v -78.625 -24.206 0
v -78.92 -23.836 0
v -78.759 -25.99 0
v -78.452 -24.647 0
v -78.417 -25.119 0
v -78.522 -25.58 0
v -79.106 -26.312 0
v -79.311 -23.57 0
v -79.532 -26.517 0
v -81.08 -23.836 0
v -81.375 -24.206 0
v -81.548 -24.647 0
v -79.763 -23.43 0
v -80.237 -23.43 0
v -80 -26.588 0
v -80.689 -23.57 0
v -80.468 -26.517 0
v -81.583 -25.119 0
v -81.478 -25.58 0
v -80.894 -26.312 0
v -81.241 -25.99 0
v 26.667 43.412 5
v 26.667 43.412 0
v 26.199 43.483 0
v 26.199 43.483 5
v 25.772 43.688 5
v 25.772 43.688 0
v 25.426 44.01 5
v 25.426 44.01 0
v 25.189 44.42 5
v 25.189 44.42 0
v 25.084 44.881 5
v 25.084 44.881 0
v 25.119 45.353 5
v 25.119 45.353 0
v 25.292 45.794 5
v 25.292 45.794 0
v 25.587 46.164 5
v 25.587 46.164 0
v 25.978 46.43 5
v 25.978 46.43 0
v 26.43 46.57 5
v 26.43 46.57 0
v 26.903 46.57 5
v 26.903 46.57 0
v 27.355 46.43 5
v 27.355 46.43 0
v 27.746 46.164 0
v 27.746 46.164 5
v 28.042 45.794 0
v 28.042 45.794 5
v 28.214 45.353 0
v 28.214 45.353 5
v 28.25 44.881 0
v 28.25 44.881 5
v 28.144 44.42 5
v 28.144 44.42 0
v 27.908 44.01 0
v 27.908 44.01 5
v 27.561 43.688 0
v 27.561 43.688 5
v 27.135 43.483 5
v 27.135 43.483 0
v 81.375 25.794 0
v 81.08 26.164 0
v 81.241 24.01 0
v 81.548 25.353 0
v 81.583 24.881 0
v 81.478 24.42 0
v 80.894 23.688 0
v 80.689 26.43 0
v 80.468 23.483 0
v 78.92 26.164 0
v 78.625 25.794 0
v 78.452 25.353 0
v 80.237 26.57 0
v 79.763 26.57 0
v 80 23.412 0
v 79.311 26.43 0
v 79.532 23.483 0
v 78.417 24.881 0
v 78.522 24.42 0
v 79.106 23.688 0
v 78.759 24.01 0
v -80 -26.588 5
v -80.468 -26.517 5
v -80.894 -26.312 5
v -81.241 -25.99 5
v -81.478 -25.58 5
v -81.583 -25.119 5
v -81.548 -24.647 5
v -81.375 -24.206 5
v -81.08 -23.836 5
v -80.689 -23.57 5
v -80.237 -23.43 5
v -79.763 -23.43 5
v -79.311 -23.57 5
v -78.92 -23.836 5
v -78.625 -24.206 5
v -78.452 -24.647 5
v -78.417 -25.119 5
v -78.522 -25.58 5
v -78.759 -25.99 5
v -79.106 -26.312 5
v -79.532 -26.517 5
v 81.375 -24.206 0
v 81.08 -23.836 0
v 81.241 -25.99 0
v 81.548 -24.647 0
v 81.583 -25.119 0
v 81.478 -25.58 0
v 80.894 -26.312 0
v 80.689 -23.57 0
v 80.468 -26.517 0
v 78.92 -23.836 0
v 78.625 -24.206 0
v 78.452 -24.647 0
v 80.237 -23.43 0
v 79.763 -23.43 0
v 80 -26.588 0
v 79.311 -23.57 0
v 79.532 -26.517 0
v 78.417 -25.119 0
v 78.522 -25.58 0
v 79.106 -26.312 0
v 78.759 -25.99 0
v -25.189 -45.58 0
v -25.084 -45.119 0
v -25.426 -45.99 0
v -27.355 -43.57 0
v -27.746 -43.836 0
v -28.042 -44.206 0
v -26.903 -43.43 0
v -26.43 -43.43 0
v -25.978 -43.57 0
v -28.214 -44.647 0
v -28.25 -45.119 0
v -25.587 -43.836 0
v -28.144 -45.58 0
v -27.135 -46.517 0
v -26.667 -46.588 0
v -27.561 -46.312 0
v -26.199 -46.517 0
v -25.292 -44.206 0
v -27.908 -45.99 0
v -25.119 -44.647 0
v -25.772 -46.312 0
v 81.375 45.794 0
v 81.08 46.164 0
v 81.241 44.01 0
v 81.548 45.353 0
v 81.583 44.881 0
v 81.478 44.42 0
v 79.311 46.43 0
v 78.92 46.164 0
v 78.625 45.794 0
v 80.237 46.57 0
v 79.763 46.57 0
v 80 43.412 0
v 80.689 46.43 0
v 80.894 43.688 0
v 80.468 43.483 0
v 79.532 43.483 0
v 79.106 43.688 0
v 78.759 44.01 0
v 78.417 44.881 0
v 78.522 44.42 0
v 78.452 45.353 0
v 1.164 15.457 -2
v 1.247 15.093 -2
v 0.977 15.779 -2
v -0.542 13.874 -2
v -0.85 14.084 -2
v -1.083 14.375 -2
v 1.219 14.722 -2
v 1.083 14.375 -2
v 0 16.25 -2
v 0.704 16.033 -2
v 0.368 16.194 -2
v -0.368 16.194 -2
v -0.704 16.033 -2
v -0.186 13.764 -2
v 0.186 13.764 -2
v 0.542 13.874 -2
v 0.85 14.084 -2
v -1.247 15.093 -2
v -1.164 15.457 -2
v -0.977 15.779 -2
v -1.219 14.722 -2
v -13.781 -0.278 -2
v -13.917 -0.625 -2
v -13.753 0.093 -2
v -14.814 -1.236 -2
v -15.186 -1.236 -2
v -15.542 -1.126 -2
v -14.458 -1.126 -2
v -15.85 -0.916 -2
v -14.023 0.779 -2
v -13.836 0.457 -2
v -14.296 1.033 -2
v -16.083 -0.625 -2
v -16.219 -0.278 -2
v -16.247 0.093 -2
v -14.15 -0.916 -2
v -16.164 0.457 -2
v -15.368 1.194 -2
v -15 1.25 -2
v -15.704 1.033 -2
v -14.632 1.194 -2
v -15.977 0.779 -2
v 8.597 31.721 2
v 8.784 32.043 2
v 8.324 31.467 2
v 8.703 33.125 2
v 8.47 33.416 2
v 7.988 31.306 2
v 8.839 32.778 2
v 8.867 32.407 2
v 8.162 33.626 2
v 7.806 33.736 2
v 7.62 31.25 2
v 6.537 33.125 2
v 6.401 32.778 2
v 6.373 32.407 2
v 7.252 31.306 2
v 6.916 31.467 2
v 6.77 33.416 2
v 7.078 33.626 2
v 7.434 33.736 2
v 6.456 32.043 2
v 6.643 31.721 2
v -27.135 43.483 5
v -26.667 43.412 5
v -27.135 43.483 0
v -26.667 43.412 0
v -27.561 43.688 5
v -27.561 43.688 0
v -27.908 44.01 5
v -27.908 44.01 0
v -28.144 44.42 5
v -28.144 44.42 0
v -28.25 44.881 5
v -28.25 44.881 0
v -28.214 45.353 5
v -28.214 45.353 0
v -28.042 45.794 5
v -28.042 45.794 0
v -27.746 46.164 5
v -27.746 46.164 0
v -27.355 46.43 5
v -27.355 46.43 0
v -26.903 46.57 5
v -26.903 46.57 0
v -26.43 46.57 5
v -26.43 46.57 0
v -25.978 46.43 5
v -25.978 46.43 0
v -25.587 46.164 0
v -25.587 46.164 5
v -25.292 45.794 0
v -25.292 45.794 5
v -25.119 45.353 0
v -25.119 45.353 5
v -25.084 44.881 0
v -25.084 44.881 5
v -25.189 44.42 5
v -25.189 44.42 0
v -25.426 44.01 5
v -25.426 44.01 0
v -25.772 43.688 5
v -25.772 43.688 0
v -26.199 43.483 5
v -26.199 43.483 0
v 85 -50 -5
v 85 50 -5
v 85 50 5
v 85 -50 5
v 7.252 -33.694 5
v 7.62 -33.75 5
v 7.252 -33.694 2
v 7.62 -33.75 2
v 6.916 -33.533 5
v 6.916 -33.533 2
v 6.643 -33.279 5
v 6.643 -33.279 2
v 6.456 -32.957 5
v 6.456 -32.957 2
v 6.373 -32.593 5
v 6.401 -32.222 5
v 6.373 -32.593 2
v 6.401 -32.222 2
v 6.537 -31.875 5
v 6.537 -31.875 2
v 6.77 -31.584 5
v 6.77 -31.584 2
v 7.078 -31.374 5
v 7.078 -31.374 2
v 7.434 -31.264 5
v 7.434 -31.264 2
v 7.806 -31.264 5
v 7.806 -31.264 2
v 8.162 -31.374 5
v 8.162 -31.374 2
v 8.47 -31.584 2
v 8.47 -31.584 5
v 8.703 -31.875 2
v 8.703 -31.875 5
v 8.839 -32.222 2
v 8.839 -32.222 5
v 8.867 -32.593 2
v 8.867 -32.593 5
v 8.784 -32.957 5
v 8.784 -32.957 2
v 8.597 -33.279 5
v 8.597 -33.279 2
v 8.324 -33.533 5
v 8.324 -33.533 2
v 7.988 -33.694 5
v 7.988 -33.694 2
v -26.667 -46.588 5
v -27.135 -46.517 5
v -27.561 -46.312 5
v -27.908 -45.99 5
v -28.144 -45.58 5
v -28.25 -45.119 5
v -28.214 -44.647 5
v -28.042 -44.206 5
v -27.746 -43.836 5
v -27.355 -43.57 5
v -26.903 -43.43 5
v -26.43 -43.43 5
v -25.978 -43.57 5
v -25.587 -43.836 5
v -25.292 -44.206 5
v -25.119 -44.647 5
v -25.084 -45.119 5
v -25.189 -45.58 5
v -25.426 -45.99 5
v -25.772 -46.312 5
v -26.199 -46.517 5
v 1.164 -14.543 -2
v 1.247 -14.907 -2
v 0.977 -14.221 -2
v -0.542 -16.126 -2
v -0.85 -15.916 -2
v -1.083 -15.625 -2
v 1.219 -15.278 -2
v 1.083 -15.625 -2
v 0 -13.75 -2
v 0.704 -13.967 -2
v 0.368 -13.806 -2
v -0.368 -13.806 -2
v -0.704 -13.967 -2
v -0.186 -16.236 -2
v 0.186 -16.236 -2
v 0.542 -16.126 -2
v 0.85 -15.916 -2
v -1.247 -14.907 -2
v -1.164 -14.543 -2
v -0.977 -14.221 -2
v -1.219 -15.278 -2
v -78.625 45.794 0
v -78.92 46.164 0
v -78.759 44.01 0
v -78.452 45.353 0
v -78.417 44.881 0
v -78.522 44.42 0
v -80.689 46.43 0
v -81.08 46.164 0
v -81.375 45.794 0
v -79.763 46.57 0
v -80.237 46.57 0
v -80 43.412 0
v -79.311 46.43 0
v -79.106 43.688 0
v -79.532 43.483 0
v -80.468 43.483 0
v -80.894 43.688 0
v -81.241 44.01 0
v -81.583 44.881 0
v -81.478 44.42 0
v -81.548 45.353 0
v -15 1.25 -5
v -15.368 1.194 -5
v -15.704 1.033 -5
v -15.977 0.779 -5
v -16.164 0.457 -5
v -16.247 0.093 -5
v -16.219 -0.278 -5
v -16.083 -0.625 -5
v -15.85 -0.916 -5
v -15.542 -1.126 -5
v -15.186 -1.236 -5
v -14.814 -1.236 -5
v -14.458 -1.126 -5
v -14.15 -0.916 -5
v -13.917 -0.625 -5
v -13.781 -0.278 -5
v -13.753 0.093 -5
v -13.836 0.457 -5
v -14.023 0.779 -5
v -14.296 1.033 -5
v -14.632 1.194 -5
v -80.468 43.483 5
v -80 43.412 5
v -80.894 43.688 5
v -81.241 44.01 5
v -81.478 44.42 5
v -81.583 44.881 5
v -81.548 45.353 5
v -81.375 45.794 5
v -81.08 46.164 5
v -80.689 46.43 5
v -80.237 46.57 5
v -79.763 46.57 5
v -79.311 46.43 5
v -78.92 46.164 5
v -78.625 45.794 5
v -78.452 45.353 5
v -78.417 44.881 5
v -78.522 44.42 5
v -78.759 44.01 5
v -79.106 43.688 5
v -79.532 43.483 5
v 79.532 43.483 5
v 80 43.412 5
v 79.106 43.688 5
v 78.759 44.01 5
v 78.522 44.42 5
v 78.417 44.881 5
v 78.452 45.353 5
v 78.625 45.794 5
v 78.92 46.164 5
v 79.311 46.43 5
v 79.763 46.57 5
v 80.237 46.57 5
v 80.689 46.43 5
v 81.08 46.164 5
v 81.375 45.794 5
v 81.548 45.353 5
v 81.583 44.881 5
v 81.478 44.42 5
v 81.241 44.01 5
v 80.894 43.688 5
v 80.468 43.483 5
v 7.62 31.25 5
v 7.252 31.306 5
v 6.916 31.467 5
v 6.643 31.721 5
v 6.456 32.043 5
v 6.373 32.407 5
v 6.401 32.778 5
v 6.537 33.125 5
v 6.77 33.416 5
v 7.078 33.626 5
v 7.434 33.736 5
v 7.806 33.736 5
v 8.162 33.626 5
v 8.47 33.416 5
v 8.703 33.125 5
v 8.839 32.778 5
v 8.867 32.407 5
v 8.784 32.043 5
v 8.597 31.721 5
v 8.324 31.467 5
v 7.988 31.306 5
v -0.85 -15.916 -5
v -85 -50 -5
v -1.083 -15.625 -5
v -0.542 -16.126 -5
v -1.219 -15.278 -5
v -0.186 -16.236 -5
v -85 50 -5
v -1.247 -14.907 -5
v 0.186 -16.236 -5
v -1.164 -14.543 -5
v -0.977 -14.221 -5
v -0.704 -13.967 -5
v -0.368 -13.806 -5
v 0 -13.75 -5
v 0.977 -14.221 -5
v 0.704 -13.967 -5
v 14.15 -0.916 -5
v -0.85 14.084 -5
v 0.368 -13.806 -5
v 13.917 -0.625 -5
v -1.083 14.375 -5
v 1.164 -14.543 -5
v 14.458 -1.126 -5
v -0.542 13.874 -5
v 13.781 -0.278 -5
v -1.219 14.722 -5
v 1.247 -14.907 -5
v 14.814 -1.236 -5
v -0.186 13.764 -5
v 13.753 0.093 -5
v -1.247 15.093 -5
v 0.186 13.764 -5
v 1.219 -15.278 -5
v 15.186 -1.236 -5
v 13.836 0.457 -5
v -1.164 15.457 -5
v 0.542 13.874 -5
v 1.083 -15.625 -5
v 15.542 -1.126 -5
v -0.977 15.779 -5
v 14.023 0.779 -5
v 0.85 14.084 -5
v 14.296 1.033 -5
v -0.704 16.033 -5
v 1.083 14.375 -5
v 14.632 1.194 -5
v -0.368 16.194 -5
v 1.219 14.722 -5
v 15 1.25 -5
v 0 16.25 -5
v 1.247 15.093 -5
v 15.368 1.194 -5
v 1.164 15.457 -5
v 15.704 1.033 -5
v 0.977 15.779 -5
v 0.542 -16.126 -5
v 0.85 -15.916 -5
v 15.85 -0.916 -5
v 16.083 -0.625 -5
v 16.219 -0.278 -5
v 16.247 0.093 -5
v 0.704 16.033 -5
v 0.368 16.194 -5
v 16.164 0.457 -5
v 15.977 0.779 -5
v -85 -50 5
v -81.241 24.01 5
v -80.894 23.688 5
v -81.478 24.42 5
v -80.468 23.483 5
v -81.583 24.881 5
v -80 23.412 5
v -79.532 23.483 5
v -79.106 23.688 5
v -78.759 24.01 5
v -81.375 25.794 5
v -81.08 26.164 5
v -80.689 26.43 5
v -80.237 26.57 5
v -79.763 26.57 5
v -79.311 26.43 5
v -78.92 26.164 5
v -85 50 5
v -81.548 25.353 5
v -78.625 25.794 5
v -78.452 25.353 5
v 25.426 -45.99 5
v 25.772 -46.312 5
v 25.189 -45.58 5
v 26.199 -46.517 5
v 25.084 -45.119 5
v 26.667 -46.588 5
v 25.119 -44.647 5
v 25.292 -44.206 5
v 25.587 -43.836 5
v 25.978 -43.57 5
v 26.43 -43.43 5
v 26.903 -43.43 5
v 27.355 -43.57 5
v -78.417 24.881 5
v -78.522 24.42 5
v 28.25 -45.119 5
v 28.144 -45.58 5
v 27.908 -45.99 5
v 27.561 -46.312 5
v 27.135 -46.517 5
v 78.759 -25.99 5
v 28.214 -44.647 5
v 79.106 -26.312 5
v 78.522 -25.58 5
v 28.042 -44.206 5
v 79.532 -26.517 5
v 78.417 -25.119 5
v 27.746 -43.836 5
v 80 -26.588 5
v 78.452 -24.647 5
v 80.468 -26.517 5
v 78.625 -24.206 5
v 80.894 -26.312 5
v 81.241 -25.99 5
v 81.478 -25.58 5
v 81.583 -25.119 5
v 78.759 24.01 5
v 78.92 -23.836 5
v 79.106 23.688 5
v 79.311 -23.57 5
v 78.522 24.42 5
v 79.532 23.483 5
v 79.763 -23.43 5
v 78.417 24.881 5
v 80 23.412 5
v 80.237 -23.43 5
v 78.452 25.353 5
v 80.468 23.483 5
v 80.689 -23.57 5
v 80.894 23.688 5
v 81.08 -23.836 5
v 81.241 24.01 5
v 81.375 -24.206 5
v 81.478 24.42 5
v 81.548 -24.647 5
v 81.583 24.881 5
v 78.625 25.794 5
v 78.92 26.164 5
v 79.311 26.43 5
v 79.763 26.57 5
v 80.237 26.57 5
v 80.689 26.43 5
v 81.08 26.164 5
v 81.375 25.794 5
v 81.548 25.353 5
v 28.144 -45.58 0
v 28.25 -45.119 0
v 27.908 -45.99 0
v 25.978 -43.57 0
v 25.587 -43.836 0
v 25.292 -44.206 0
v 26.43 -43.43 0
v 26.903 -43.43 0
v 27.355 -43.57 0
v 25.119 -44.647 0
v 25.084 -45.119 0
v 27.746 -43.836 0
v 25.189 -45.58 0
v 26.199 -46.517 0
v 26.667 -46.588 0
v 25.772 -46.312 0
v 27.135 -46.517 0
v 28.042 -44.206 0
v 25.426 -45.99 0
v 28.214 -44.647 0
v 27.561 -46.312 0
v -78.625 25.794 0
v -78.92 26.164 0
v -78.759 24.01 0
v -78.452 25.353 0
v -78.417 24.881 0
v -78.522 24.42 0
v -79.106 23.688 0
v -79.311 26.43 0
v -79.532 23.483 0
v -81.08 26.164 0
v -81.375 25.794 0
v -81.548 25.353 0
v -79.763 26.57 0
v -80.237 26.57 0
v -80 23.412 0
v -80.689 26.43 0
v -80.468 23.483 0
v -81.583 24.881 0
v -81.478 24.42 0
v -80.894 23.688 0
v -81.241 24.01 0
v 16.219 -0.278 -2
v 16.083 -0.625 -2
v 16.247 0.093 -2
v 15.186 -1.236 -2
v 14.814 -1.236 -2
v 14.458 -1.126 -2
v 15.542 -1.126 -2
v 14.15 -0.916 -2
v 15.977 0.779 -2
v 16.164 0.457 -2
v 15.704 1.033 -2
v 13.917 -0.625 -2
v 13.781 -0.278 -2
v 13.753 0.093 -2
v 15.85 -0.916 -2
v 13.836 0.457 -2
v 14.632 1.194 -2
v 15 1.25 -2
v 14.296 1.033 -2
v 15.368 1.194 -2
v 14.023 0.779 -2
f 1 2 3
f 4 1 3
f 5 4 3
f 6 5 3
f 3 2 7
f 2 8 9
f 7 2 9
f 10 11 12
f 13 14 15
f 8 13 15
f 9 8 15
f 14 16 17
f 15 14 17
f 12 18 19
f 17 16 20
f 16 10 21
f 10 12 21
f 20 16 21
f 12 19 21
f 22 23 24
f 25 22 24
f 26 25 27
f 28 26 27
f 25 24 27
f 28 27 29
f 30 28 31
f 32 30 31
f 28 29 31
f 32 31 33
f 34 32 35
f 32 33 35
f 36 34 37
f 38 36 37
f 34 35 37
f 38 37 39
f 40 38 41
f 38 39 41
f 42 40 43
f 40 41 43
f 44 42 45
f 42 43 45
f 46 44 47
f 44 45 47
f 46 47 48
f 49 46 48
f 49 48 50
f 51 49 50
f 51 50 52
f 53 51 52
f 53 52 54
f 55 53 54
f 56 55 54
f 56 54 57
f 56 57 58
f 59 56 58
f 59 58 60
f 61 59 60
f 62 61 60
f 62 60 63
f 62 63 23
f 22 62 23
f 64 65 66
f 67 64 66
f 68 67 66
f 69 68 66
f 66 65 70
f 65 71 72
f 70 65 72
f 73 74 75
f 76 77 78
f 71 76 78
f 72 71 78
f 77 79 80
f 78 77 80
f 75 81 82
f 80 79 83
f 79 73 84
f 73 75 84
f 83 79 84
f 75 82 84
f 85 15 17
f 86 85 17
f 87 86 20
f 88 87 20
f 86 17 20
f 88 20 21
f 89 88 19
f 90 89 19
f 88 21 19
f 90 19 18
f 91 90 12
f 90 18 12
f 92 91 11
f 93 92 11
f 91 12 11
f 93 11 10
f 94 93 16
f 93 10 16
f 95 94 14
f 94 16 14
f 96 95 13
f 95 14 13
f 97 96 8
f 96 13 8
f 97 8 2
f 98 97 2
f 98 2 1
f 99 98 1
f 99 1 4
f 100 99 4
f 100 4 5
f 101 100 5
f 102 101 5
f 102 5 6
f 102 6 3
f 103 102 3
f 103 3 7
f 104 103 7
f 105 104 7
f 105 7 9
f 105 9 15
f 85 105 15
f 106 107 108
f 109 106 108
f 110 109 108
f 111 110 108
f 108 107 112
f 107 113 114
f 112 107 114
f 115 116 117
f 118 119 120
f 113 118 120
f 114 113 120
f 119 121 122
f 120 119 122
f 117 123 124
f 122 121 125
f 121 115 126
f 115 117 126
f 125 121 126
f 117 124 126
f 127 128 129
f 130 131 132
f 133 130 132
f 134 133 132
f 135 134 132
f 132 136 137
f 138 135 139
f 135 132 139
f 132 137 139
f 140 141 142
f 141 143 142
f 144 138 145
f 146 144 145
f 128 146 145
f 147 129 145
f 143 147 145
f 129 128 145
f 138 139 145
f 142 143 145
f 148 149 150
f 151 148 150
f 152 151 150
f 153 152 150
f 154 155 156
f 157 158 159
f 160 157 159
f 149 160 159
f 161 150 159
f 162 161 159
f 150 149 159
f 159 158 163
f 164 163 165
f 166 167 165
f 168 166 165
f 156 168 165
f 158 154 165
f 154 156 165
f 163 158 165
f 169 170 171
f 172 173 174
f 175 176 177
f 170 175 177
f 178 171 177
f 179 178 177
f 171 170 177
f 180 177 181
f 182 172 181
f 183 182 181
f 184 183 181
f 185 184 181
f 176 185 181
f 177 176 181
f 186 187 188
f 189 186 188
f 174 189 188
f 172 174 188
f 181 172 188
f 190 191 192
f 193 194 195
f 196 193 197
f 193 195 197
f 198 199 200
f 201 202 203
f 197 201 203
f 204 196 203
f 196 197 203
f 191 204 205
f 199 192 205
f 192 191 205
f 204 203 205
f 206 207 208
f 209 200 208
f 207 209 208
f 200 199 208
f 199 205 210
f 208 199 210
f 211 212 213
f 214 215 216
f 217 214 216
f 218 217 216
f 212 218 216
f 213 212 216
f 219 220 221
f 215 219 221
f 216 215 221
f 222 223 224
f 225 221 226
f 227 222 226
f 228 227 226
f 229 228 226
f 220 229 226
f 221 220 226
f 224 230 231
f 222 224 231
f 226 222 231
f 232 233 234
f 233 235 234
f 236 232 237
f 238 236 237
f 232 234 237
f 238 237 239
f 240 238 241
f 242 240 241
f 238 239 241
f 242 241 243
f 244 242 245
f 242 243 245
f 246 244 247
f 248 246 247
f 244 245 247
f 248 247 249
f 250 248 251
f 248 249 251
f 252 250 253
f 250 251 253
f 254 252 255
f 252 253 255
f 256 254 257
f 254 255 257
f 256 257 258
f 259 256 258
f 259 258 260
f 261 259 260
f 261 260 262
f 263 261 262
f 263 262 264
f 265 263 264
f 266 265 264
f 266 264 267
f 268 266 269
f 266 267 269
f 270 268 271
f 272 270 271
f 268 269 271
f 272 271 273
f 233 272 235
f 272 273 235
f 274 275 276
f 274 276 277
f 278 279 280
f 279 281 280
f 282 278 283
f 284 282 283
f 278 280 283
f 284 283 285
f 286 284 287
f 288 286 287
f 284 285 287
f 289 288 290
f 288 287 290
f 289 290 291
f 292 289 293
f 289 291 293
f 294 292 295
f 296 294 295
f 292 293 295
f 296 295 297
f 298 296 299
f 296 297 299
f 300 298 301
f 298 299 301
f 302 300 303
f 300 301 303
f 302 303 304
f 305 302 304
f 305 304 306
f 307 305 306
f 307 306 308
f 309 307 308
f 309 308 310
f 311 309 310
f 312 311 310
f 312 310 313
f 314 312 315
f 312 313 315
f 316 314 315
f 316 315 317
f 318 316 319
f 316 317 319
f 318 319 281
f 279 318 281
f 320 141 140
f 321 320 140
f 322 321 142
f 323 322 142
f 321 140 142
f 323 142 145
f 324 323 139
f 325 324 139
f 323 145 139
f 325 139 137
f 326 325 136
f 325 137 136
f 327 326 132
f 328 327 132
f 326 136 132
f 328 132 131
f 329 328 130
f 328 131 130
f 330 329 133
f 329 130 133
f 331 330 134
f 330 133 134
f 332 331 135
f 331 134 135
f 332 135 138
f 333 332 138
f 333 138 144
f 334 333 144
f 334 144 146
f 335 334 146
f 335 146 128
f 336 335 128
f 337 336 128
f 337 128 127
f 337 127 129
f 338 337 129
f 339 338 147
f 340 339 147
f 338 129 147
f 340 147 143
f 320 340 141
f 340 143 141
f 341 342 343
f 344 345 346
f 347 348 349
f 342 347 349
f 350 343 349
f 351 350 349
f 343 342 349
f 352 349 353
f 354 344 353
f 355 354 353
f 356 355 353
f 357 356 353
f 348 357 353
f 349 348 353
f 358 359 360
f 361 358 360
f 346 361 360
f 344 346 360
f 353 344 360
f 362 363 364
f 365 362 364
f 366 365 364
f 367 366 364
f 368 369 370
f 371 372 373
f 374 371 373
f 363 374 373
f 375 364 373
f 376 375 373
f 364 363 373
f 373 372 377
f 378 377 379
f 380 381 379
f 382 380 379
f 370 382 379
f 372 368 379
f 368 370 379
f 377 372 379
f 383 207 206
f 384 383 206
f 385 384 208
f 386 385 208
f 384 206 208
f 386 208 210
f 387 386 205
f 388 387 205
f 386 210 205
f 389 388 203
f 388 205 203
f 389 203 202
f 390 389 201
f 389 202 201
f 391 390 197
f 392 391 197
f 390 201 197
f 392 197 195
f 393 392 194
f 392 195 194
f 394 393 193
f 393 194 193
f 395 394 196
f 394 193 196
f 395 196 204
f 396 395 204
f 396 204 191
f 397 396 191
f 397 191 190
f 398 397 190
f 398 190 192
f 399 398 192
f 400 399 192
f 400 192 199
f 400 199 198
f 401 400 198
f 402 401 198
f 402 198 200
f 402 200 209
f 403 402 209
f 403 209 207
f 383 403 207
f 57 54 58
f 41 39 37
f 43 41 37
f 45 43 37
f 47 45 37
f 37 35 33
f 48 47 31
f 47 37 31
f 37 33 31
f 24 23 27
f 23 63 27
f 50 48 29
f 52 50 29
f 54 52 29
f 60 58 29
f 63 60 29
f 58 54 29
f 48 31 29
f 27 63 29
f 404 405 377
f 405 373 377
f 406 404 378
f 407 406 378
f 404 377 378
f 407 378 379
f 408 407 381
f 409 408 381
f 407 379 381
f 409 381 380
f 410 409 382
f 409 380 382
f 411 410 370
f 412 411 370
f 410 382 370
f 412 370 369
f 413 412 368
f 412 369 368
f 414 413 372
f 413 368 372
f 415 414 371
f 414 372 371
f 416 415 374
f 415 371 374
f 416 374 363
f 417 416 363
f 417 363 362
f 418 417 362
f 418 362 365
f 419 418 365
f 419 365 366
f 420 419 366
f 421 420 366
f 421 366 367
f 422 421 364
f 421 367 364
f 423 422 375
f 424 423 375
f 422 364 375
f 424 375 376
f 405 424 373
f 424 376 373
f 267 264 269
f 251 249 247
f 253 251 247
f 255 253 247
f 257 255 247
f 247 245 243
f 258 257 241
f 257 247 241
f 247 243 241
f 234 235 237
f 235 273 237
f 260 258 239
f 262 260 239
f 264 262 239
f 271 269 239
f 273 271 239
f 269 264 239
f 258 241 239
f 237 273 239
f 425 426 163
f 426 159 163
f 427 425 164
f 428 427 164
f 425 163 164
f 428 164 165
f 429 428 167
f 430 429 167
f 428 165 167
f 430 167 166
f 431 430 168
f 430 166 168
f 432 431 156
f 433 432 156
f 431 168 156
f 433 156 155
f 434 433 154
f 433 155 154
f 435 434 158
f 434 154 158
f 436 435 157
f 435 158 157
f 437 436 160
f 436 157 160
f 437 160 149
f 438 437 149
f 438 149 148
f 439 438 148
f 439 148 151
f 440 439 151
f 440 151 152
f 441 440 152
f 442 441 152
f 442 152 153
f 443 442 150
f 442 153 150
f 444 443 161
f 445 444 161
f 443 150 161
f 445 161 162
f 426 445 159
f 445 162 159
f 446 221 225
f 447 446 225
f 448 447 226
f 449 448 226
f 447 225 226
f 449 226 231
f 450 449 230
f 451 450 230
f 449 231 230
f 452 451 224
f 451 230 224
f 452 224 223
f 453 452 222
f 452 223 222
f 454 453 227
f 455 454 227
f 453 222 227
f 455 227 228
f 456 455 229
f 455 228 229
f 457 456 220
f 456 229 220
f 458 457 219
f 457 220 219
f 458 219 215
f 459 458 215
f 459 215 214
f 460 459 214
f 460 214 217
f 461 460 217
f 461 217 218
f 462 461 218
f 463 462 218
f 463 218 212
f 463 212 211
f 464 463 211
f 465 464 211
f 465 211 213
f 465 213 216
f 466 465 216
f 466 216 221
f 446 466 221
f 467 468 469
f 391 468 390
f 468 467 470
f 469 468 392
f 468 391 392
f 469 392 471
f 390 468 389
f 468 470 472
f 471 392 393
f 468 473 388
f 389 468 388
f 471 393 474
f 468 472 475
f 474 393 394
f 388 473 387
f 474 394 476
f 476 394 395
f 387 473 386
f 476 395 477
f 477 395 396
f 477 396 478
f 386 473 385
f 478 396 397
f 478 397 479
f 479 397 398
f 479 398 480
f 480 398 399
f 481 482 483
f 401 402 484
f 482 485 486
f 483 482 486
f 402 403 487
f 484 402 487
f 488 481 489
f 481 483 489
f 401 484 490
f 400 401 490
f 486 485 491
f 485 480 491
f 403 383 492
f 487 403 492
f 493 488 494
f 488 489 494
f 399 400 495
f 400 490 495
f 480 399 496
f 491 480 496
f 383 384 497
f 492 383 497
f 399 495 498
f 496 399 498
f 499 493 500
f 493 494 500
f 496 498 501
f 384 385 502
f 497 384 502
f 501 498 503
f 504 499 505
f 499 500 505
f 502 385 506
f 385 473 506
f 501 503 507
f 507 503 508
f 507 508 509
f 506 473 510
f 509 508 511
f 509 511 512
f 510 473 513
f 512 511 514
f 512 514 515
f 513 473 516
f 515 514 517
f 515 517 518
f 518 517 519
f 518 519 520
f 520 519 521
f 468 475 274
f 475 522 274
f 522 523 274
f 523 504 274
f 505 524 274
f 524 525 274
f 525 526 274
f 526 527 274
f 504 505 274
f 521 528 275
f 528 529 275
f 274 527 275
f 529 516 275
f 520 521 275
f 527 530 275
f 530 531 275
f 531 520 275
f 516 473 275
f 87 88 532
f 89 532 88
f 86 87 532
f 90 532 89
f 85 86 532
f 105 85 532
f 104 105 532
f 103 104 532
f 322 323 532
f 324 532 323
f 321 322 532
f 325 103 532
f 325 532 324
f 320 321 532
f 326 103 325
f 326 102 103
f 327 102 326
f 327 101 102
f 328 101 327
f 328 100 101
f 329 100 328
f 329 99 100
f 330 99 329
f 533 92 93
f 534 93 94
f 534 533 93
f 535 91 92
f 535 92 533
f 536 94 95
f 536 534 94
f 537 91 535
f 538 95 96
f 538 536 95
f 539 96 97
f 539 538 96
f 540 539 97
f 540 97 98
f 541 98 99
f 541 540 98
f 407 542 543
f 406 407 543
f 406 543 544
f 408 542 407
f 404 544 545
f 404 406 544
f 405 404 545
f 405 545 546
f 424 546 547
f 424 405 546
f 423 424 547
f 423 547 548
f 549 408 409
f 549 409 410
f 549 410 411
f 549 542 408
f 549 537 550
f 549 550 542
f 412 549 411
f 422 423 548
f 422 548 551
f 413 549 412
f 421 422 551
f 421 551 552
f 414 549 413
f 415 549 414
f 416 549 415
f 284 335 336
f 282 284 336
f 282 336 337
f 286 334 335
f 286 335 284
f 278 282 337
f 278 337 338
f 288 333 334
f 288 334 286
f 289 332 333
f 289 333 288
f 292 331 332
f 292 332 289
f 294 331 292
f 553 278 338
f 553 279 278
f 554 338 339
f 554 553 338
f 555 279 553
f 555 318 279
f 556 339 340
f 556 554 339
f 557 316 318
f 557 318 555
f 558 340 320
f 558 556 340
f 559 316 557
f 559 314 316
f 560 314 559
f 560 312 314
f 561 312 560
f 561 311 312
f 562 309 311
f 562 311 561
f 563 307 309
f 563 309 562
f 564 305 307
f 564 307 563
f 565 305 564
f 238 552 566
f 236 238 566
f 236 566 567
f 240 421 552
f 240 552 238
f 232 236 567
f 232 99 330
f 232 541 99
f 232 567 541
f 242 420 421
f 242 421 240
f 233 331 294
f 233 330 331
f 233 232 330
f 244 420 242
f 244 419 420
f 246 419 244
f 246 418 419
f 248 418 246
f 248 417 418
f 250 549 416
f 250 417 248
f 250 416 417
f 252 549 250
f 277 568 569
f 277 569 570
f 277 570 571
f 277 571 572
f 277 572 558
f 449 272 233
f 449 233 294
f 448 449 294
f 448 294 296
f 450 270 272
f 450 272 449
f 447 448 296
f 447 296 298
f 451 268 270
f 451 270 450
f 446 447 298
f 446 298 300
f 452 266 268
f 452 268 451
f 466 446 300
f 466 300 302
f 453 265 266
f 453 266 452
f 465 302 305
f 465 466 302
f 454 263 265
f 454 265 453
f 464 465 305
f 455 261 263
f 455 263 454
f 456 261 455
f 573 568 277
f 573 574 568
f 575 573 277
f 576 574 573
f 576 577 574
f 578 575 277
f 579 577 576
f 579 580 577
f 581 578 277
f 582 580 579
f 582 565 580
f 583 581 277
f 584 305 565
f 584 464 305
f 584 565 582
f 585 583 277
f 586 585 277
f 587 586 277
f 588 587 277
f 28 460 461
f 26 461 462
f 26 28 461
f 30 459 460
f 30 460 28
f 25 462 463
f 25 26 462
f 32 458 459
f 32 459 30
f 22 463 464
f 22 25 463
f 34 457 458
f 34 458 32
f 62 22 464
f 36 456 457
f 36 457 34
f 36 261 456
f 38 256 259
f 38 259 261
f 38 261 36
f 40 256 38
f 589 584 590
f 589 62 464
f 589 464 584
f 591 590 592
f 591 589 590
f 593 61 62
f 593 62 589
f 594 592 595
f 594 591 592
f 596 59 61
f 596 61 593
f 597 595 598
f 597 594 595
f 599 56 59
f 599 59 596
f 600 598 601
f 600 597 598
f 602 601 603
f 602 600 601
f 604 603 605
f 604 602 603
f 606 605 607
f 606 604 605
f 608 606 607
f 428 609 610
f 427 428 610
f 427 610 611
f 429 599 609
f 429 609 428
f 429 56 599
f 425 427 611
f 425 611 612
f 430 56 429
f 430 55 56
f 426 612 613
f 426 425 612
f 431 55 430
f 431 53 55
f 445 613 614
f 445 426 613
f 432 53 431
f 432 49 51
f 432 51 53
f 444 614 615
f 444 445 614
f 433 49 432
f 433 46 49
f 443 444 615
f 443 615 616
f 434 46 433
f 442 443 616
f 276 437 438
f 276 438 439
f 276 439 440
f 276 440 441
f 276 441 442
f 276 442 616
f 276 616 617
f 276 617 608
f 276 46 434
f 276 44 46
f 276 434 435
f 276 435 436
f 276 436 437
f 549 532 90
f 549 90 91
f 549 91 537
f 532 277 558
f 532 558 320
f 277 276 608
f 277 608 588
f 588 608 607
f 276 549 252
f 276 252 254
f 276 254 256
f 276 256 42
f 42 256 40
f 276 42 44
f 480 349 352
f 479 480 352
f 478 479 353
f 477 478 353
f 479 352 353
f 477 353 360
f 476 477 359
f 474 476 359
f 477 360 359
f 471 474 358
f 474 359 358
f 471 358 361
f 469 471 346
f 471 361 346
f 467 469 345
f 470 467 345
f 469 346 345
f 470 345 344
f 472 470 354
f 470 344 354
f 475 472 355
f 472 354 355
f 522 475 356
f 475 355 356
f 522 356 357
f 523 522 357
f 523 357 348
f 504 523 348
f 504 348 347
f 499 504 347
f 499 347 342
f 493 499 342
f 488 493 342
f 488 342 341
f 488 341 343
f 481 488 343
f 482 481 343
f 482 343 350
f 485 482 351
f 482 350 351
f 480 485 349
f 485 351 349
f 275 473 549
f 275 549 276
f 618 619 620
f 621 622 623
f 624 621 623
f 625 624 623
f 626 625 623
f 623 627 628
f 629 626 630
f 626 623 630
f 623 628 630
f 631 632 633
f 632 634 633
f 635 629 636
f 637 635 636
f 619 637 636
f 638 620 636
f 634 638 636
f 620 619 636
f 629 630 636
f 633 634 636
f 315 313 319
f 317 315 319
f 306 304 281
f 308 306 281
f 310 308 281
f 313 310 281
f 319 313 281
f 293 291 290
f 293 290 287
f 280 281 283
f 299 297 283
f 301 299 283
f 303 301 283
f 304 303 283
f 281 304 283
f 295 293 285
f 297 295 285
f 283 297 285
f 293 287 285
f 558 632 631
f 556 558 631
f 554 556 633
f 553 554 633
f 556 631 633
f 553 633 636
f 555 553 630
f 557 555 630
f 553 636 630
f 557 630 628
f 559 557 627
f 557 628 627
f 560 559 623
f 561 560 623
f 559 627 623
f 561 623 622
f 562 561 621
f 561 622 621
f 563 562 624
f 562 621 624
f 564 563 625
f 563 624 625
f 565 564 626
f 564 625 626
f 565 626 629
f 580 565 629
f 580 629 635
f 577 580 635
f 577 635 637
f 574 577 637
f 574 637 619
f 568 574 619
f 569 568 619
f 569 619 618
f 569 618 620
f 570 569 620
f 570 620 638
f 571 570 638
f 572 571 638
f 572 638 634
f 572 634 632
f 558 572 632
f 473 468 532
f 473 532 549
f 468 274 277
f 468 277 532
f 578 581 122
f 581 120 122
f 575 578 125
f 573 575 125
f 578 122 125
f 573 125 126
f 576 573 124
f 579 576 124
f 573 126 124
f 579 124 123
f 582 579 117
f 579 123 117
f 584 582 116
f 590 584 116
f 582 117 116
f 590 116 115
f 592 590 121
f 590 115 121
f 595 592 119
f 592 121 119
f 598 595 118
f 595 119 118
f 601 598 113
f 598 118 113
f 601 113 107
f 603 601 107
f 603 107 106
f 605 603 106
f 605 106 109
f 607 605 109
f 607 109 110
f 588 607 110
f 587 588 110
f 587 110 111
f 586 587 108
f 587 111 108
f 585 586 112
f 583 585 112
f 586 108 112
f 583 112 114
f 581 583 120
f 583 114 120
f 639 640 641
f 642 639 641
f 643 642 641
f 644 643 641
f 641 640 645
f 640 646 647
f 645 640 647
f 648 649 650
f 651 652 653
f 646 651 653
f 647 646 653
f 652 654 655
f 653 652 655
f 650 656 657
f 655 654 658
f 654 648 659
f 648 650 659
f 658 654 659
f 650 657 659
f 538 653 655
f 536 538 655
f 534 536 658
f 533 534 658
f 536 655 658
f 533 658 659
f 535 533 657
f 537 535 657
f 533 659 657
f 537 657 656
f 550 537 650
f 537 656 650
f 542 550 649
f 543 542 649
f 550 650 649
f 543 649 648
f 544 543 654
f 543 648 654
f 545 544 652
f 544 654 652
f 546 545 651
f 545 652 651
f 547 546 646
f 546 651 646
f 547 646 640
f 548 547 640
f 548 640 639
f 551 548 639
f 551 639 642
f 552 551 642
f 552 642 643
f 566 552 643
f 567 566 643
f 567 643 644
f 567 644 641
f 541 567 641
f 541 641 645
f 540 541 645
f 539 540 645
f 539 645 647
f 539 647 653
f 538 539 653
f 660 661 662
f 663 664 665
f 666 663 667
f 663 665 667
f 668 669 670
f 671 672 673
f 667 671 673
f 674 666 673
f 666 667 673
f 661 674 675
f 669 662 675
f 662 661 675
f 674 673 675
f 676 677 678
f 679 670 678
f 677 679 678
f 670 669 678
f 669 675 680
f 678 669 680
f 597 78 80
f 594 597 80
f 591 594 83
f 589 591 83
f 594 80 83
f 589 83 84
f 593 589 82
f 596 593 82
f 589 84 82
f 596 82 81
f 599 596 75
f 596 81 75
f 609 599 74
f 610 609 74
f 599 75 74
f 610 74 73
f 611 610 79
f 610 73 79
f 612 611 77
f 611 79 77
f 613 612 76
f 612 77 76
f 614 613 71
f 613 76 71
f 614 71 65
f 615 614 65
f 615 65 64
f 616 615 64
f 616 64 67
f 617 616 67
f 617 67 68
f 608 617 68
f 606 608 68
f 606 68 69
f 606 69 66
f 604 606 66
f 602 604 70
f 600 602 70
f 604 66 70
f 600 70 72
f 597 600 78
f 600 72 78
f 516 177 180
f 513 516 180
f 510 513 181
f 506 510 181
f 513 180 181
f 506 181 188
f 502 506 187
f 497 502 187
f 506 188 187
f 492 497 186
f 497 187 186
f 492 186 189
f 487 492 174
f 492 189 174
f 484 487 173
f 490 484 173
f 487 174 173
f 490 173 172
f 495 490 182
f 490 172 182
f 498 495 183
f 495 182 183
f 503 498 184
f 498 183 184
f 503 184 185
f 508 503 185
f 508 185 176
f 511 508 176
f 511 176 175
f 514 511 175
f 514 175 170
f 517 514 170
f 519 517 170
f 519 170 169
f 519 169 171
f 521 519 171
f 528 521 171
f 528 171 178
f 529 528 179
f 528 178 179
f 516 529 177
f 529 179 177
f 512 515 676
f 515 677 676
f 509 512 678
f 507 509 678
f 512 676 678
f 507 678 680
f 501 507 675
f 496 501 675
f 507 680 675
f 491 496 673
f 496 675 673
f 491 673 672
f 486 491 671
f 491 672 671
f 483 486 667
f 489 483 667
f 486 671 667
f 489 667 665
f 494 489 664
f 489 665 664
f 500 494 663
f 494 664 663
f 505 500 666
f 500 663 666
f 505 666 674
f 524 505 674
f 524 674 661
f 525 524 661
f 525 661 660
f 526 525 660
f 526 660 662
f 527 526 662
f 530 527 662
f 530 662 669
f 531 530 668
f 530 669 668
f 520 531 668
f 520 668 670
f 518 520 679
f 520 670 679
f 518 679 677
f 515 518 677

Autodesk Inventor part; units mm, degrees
ref_plane "YZ Plane" through (0, 0, 0) normal (1, 0, 0) x (0, 1, 0)
ref_plane "XZ Plane" through (0, 0, 0) normal (0, 1, 0) x (-1, 0, 0)
ref_plane "XY Plane" through (0, 0, 0) normal (0, 0, 1) x (1, 0, 0)
sketch "Sketch1" plane through (0, 0, 0) normal (0, 0, 1) x (1, 0, 0)
  line L0 (-85, 50) -> (85, 50)
  line L1 (85, 50) -> (85, -50)
  line L2 (85, -50) -> (-85, -50)
  line L3 (-85, -50) -> (-85, 50)
  line L4 (-85, 50) -> (85, -50) construction
  line L5 (85, 50) -> (-85, -50) construction
  point P0 (0, 0)
  dimension "d0" = 170
  dimension "d1" = 100
extrude "Extrusion1" add sketch "Sketch1" along normal mid plane 10
sketch "Sketch2" plane through (0, 0, 5) normal (0, 0, 1) x (1, 0, 0)
  line L0 (-85, 50) -> (-85, -50) projected
  line L1 (-85, -50) -> (85, -50) projected
  line L2 (85, -50) -> (85, 50) projected
  line L3 (85, 50) -> (-85, 50) projected
  line L4 (-85, 50) -> (-85, -50) projected
  point P0 (0, 0)
  point P1 (80, 45)
  point P2 (26.6667, 45)
  point P3 (-80, 45)
  point P4 (80, 25)
  point P5 (80, -25)
  point P6 (-80, 25)
  point P7 (-80, -25)
  point P8 (-26.6667, 45)
  point P9 (26.6667, -45)
  point P10 (-26.6667, -45)
  dimension "d17" = 53.3333
  dimension "d53" = 50
  dimension "d61" = 160
  dimension "d68" = 160
  dimension "d73" = 5
  dimension "d74" = 5
  dimension "d75" = 5
  dimension "d77" = 5
  dimension "d112" = 53.3333
  dimension "d115" = 90
  dimension "d118" = 25
hole "Hole1" at (-80, 45, 5) at (26.6667, 45, 5) at (80, 45, 5) at (80, 25, 5) at (80, -25, 5) at (-80, 25, 5) at (-80, -25, 5) at (-26.6667, 45, 5) at (-26.6667, -45, 5) at (26.6667, -45, 5) direction (0, 0, -1) diameter 3.175 depth 5
sketch "Sketch3" plane through (0, 0, -5) normal (0, 0, -1) x (-1, 0, 0)
  point P0 (0, 0)
  point P1 (0, 15)
  point P2 (-15, 0)
  point P3 (0, -15)
  point P4 (15, 0)
  dimension "d81" = 15
  dimension "d84" = 360
hole "Hole2" at (0, 15, -5) at (15, 0, -5) at (0, -15, -5) at (-15, 0, -5) direction (0, 0, 1) diameter 2.5 depth 3
sketch "Sketch4" plane through (0, 0, 5) normal (0, 0, 1) x (1, 0, 0)
  line L0 (85, -50) -> (85, 50) projected
  line L1 (-85, 50) -> (-85, -50) projected
  point P0 (0, 0)
  point P1 (7.62, 32.5)
  point P2 (7.62, -32.5)
  dimension "d94" = 32.5
  dimension "d97" = 65
  dimension "d109" = 92.62
hole "Hole3" at (7.62, 32.5, 5) at (7.62, -32.5, 5) direction (0, 0, -1) diameter 2.5 depth 3
equation "\"d17\" = 0.333333 * d61"
equation "\"d112\" = d17"
equation "\"d118\" = 0.5 * d53"
properties part number "base"
